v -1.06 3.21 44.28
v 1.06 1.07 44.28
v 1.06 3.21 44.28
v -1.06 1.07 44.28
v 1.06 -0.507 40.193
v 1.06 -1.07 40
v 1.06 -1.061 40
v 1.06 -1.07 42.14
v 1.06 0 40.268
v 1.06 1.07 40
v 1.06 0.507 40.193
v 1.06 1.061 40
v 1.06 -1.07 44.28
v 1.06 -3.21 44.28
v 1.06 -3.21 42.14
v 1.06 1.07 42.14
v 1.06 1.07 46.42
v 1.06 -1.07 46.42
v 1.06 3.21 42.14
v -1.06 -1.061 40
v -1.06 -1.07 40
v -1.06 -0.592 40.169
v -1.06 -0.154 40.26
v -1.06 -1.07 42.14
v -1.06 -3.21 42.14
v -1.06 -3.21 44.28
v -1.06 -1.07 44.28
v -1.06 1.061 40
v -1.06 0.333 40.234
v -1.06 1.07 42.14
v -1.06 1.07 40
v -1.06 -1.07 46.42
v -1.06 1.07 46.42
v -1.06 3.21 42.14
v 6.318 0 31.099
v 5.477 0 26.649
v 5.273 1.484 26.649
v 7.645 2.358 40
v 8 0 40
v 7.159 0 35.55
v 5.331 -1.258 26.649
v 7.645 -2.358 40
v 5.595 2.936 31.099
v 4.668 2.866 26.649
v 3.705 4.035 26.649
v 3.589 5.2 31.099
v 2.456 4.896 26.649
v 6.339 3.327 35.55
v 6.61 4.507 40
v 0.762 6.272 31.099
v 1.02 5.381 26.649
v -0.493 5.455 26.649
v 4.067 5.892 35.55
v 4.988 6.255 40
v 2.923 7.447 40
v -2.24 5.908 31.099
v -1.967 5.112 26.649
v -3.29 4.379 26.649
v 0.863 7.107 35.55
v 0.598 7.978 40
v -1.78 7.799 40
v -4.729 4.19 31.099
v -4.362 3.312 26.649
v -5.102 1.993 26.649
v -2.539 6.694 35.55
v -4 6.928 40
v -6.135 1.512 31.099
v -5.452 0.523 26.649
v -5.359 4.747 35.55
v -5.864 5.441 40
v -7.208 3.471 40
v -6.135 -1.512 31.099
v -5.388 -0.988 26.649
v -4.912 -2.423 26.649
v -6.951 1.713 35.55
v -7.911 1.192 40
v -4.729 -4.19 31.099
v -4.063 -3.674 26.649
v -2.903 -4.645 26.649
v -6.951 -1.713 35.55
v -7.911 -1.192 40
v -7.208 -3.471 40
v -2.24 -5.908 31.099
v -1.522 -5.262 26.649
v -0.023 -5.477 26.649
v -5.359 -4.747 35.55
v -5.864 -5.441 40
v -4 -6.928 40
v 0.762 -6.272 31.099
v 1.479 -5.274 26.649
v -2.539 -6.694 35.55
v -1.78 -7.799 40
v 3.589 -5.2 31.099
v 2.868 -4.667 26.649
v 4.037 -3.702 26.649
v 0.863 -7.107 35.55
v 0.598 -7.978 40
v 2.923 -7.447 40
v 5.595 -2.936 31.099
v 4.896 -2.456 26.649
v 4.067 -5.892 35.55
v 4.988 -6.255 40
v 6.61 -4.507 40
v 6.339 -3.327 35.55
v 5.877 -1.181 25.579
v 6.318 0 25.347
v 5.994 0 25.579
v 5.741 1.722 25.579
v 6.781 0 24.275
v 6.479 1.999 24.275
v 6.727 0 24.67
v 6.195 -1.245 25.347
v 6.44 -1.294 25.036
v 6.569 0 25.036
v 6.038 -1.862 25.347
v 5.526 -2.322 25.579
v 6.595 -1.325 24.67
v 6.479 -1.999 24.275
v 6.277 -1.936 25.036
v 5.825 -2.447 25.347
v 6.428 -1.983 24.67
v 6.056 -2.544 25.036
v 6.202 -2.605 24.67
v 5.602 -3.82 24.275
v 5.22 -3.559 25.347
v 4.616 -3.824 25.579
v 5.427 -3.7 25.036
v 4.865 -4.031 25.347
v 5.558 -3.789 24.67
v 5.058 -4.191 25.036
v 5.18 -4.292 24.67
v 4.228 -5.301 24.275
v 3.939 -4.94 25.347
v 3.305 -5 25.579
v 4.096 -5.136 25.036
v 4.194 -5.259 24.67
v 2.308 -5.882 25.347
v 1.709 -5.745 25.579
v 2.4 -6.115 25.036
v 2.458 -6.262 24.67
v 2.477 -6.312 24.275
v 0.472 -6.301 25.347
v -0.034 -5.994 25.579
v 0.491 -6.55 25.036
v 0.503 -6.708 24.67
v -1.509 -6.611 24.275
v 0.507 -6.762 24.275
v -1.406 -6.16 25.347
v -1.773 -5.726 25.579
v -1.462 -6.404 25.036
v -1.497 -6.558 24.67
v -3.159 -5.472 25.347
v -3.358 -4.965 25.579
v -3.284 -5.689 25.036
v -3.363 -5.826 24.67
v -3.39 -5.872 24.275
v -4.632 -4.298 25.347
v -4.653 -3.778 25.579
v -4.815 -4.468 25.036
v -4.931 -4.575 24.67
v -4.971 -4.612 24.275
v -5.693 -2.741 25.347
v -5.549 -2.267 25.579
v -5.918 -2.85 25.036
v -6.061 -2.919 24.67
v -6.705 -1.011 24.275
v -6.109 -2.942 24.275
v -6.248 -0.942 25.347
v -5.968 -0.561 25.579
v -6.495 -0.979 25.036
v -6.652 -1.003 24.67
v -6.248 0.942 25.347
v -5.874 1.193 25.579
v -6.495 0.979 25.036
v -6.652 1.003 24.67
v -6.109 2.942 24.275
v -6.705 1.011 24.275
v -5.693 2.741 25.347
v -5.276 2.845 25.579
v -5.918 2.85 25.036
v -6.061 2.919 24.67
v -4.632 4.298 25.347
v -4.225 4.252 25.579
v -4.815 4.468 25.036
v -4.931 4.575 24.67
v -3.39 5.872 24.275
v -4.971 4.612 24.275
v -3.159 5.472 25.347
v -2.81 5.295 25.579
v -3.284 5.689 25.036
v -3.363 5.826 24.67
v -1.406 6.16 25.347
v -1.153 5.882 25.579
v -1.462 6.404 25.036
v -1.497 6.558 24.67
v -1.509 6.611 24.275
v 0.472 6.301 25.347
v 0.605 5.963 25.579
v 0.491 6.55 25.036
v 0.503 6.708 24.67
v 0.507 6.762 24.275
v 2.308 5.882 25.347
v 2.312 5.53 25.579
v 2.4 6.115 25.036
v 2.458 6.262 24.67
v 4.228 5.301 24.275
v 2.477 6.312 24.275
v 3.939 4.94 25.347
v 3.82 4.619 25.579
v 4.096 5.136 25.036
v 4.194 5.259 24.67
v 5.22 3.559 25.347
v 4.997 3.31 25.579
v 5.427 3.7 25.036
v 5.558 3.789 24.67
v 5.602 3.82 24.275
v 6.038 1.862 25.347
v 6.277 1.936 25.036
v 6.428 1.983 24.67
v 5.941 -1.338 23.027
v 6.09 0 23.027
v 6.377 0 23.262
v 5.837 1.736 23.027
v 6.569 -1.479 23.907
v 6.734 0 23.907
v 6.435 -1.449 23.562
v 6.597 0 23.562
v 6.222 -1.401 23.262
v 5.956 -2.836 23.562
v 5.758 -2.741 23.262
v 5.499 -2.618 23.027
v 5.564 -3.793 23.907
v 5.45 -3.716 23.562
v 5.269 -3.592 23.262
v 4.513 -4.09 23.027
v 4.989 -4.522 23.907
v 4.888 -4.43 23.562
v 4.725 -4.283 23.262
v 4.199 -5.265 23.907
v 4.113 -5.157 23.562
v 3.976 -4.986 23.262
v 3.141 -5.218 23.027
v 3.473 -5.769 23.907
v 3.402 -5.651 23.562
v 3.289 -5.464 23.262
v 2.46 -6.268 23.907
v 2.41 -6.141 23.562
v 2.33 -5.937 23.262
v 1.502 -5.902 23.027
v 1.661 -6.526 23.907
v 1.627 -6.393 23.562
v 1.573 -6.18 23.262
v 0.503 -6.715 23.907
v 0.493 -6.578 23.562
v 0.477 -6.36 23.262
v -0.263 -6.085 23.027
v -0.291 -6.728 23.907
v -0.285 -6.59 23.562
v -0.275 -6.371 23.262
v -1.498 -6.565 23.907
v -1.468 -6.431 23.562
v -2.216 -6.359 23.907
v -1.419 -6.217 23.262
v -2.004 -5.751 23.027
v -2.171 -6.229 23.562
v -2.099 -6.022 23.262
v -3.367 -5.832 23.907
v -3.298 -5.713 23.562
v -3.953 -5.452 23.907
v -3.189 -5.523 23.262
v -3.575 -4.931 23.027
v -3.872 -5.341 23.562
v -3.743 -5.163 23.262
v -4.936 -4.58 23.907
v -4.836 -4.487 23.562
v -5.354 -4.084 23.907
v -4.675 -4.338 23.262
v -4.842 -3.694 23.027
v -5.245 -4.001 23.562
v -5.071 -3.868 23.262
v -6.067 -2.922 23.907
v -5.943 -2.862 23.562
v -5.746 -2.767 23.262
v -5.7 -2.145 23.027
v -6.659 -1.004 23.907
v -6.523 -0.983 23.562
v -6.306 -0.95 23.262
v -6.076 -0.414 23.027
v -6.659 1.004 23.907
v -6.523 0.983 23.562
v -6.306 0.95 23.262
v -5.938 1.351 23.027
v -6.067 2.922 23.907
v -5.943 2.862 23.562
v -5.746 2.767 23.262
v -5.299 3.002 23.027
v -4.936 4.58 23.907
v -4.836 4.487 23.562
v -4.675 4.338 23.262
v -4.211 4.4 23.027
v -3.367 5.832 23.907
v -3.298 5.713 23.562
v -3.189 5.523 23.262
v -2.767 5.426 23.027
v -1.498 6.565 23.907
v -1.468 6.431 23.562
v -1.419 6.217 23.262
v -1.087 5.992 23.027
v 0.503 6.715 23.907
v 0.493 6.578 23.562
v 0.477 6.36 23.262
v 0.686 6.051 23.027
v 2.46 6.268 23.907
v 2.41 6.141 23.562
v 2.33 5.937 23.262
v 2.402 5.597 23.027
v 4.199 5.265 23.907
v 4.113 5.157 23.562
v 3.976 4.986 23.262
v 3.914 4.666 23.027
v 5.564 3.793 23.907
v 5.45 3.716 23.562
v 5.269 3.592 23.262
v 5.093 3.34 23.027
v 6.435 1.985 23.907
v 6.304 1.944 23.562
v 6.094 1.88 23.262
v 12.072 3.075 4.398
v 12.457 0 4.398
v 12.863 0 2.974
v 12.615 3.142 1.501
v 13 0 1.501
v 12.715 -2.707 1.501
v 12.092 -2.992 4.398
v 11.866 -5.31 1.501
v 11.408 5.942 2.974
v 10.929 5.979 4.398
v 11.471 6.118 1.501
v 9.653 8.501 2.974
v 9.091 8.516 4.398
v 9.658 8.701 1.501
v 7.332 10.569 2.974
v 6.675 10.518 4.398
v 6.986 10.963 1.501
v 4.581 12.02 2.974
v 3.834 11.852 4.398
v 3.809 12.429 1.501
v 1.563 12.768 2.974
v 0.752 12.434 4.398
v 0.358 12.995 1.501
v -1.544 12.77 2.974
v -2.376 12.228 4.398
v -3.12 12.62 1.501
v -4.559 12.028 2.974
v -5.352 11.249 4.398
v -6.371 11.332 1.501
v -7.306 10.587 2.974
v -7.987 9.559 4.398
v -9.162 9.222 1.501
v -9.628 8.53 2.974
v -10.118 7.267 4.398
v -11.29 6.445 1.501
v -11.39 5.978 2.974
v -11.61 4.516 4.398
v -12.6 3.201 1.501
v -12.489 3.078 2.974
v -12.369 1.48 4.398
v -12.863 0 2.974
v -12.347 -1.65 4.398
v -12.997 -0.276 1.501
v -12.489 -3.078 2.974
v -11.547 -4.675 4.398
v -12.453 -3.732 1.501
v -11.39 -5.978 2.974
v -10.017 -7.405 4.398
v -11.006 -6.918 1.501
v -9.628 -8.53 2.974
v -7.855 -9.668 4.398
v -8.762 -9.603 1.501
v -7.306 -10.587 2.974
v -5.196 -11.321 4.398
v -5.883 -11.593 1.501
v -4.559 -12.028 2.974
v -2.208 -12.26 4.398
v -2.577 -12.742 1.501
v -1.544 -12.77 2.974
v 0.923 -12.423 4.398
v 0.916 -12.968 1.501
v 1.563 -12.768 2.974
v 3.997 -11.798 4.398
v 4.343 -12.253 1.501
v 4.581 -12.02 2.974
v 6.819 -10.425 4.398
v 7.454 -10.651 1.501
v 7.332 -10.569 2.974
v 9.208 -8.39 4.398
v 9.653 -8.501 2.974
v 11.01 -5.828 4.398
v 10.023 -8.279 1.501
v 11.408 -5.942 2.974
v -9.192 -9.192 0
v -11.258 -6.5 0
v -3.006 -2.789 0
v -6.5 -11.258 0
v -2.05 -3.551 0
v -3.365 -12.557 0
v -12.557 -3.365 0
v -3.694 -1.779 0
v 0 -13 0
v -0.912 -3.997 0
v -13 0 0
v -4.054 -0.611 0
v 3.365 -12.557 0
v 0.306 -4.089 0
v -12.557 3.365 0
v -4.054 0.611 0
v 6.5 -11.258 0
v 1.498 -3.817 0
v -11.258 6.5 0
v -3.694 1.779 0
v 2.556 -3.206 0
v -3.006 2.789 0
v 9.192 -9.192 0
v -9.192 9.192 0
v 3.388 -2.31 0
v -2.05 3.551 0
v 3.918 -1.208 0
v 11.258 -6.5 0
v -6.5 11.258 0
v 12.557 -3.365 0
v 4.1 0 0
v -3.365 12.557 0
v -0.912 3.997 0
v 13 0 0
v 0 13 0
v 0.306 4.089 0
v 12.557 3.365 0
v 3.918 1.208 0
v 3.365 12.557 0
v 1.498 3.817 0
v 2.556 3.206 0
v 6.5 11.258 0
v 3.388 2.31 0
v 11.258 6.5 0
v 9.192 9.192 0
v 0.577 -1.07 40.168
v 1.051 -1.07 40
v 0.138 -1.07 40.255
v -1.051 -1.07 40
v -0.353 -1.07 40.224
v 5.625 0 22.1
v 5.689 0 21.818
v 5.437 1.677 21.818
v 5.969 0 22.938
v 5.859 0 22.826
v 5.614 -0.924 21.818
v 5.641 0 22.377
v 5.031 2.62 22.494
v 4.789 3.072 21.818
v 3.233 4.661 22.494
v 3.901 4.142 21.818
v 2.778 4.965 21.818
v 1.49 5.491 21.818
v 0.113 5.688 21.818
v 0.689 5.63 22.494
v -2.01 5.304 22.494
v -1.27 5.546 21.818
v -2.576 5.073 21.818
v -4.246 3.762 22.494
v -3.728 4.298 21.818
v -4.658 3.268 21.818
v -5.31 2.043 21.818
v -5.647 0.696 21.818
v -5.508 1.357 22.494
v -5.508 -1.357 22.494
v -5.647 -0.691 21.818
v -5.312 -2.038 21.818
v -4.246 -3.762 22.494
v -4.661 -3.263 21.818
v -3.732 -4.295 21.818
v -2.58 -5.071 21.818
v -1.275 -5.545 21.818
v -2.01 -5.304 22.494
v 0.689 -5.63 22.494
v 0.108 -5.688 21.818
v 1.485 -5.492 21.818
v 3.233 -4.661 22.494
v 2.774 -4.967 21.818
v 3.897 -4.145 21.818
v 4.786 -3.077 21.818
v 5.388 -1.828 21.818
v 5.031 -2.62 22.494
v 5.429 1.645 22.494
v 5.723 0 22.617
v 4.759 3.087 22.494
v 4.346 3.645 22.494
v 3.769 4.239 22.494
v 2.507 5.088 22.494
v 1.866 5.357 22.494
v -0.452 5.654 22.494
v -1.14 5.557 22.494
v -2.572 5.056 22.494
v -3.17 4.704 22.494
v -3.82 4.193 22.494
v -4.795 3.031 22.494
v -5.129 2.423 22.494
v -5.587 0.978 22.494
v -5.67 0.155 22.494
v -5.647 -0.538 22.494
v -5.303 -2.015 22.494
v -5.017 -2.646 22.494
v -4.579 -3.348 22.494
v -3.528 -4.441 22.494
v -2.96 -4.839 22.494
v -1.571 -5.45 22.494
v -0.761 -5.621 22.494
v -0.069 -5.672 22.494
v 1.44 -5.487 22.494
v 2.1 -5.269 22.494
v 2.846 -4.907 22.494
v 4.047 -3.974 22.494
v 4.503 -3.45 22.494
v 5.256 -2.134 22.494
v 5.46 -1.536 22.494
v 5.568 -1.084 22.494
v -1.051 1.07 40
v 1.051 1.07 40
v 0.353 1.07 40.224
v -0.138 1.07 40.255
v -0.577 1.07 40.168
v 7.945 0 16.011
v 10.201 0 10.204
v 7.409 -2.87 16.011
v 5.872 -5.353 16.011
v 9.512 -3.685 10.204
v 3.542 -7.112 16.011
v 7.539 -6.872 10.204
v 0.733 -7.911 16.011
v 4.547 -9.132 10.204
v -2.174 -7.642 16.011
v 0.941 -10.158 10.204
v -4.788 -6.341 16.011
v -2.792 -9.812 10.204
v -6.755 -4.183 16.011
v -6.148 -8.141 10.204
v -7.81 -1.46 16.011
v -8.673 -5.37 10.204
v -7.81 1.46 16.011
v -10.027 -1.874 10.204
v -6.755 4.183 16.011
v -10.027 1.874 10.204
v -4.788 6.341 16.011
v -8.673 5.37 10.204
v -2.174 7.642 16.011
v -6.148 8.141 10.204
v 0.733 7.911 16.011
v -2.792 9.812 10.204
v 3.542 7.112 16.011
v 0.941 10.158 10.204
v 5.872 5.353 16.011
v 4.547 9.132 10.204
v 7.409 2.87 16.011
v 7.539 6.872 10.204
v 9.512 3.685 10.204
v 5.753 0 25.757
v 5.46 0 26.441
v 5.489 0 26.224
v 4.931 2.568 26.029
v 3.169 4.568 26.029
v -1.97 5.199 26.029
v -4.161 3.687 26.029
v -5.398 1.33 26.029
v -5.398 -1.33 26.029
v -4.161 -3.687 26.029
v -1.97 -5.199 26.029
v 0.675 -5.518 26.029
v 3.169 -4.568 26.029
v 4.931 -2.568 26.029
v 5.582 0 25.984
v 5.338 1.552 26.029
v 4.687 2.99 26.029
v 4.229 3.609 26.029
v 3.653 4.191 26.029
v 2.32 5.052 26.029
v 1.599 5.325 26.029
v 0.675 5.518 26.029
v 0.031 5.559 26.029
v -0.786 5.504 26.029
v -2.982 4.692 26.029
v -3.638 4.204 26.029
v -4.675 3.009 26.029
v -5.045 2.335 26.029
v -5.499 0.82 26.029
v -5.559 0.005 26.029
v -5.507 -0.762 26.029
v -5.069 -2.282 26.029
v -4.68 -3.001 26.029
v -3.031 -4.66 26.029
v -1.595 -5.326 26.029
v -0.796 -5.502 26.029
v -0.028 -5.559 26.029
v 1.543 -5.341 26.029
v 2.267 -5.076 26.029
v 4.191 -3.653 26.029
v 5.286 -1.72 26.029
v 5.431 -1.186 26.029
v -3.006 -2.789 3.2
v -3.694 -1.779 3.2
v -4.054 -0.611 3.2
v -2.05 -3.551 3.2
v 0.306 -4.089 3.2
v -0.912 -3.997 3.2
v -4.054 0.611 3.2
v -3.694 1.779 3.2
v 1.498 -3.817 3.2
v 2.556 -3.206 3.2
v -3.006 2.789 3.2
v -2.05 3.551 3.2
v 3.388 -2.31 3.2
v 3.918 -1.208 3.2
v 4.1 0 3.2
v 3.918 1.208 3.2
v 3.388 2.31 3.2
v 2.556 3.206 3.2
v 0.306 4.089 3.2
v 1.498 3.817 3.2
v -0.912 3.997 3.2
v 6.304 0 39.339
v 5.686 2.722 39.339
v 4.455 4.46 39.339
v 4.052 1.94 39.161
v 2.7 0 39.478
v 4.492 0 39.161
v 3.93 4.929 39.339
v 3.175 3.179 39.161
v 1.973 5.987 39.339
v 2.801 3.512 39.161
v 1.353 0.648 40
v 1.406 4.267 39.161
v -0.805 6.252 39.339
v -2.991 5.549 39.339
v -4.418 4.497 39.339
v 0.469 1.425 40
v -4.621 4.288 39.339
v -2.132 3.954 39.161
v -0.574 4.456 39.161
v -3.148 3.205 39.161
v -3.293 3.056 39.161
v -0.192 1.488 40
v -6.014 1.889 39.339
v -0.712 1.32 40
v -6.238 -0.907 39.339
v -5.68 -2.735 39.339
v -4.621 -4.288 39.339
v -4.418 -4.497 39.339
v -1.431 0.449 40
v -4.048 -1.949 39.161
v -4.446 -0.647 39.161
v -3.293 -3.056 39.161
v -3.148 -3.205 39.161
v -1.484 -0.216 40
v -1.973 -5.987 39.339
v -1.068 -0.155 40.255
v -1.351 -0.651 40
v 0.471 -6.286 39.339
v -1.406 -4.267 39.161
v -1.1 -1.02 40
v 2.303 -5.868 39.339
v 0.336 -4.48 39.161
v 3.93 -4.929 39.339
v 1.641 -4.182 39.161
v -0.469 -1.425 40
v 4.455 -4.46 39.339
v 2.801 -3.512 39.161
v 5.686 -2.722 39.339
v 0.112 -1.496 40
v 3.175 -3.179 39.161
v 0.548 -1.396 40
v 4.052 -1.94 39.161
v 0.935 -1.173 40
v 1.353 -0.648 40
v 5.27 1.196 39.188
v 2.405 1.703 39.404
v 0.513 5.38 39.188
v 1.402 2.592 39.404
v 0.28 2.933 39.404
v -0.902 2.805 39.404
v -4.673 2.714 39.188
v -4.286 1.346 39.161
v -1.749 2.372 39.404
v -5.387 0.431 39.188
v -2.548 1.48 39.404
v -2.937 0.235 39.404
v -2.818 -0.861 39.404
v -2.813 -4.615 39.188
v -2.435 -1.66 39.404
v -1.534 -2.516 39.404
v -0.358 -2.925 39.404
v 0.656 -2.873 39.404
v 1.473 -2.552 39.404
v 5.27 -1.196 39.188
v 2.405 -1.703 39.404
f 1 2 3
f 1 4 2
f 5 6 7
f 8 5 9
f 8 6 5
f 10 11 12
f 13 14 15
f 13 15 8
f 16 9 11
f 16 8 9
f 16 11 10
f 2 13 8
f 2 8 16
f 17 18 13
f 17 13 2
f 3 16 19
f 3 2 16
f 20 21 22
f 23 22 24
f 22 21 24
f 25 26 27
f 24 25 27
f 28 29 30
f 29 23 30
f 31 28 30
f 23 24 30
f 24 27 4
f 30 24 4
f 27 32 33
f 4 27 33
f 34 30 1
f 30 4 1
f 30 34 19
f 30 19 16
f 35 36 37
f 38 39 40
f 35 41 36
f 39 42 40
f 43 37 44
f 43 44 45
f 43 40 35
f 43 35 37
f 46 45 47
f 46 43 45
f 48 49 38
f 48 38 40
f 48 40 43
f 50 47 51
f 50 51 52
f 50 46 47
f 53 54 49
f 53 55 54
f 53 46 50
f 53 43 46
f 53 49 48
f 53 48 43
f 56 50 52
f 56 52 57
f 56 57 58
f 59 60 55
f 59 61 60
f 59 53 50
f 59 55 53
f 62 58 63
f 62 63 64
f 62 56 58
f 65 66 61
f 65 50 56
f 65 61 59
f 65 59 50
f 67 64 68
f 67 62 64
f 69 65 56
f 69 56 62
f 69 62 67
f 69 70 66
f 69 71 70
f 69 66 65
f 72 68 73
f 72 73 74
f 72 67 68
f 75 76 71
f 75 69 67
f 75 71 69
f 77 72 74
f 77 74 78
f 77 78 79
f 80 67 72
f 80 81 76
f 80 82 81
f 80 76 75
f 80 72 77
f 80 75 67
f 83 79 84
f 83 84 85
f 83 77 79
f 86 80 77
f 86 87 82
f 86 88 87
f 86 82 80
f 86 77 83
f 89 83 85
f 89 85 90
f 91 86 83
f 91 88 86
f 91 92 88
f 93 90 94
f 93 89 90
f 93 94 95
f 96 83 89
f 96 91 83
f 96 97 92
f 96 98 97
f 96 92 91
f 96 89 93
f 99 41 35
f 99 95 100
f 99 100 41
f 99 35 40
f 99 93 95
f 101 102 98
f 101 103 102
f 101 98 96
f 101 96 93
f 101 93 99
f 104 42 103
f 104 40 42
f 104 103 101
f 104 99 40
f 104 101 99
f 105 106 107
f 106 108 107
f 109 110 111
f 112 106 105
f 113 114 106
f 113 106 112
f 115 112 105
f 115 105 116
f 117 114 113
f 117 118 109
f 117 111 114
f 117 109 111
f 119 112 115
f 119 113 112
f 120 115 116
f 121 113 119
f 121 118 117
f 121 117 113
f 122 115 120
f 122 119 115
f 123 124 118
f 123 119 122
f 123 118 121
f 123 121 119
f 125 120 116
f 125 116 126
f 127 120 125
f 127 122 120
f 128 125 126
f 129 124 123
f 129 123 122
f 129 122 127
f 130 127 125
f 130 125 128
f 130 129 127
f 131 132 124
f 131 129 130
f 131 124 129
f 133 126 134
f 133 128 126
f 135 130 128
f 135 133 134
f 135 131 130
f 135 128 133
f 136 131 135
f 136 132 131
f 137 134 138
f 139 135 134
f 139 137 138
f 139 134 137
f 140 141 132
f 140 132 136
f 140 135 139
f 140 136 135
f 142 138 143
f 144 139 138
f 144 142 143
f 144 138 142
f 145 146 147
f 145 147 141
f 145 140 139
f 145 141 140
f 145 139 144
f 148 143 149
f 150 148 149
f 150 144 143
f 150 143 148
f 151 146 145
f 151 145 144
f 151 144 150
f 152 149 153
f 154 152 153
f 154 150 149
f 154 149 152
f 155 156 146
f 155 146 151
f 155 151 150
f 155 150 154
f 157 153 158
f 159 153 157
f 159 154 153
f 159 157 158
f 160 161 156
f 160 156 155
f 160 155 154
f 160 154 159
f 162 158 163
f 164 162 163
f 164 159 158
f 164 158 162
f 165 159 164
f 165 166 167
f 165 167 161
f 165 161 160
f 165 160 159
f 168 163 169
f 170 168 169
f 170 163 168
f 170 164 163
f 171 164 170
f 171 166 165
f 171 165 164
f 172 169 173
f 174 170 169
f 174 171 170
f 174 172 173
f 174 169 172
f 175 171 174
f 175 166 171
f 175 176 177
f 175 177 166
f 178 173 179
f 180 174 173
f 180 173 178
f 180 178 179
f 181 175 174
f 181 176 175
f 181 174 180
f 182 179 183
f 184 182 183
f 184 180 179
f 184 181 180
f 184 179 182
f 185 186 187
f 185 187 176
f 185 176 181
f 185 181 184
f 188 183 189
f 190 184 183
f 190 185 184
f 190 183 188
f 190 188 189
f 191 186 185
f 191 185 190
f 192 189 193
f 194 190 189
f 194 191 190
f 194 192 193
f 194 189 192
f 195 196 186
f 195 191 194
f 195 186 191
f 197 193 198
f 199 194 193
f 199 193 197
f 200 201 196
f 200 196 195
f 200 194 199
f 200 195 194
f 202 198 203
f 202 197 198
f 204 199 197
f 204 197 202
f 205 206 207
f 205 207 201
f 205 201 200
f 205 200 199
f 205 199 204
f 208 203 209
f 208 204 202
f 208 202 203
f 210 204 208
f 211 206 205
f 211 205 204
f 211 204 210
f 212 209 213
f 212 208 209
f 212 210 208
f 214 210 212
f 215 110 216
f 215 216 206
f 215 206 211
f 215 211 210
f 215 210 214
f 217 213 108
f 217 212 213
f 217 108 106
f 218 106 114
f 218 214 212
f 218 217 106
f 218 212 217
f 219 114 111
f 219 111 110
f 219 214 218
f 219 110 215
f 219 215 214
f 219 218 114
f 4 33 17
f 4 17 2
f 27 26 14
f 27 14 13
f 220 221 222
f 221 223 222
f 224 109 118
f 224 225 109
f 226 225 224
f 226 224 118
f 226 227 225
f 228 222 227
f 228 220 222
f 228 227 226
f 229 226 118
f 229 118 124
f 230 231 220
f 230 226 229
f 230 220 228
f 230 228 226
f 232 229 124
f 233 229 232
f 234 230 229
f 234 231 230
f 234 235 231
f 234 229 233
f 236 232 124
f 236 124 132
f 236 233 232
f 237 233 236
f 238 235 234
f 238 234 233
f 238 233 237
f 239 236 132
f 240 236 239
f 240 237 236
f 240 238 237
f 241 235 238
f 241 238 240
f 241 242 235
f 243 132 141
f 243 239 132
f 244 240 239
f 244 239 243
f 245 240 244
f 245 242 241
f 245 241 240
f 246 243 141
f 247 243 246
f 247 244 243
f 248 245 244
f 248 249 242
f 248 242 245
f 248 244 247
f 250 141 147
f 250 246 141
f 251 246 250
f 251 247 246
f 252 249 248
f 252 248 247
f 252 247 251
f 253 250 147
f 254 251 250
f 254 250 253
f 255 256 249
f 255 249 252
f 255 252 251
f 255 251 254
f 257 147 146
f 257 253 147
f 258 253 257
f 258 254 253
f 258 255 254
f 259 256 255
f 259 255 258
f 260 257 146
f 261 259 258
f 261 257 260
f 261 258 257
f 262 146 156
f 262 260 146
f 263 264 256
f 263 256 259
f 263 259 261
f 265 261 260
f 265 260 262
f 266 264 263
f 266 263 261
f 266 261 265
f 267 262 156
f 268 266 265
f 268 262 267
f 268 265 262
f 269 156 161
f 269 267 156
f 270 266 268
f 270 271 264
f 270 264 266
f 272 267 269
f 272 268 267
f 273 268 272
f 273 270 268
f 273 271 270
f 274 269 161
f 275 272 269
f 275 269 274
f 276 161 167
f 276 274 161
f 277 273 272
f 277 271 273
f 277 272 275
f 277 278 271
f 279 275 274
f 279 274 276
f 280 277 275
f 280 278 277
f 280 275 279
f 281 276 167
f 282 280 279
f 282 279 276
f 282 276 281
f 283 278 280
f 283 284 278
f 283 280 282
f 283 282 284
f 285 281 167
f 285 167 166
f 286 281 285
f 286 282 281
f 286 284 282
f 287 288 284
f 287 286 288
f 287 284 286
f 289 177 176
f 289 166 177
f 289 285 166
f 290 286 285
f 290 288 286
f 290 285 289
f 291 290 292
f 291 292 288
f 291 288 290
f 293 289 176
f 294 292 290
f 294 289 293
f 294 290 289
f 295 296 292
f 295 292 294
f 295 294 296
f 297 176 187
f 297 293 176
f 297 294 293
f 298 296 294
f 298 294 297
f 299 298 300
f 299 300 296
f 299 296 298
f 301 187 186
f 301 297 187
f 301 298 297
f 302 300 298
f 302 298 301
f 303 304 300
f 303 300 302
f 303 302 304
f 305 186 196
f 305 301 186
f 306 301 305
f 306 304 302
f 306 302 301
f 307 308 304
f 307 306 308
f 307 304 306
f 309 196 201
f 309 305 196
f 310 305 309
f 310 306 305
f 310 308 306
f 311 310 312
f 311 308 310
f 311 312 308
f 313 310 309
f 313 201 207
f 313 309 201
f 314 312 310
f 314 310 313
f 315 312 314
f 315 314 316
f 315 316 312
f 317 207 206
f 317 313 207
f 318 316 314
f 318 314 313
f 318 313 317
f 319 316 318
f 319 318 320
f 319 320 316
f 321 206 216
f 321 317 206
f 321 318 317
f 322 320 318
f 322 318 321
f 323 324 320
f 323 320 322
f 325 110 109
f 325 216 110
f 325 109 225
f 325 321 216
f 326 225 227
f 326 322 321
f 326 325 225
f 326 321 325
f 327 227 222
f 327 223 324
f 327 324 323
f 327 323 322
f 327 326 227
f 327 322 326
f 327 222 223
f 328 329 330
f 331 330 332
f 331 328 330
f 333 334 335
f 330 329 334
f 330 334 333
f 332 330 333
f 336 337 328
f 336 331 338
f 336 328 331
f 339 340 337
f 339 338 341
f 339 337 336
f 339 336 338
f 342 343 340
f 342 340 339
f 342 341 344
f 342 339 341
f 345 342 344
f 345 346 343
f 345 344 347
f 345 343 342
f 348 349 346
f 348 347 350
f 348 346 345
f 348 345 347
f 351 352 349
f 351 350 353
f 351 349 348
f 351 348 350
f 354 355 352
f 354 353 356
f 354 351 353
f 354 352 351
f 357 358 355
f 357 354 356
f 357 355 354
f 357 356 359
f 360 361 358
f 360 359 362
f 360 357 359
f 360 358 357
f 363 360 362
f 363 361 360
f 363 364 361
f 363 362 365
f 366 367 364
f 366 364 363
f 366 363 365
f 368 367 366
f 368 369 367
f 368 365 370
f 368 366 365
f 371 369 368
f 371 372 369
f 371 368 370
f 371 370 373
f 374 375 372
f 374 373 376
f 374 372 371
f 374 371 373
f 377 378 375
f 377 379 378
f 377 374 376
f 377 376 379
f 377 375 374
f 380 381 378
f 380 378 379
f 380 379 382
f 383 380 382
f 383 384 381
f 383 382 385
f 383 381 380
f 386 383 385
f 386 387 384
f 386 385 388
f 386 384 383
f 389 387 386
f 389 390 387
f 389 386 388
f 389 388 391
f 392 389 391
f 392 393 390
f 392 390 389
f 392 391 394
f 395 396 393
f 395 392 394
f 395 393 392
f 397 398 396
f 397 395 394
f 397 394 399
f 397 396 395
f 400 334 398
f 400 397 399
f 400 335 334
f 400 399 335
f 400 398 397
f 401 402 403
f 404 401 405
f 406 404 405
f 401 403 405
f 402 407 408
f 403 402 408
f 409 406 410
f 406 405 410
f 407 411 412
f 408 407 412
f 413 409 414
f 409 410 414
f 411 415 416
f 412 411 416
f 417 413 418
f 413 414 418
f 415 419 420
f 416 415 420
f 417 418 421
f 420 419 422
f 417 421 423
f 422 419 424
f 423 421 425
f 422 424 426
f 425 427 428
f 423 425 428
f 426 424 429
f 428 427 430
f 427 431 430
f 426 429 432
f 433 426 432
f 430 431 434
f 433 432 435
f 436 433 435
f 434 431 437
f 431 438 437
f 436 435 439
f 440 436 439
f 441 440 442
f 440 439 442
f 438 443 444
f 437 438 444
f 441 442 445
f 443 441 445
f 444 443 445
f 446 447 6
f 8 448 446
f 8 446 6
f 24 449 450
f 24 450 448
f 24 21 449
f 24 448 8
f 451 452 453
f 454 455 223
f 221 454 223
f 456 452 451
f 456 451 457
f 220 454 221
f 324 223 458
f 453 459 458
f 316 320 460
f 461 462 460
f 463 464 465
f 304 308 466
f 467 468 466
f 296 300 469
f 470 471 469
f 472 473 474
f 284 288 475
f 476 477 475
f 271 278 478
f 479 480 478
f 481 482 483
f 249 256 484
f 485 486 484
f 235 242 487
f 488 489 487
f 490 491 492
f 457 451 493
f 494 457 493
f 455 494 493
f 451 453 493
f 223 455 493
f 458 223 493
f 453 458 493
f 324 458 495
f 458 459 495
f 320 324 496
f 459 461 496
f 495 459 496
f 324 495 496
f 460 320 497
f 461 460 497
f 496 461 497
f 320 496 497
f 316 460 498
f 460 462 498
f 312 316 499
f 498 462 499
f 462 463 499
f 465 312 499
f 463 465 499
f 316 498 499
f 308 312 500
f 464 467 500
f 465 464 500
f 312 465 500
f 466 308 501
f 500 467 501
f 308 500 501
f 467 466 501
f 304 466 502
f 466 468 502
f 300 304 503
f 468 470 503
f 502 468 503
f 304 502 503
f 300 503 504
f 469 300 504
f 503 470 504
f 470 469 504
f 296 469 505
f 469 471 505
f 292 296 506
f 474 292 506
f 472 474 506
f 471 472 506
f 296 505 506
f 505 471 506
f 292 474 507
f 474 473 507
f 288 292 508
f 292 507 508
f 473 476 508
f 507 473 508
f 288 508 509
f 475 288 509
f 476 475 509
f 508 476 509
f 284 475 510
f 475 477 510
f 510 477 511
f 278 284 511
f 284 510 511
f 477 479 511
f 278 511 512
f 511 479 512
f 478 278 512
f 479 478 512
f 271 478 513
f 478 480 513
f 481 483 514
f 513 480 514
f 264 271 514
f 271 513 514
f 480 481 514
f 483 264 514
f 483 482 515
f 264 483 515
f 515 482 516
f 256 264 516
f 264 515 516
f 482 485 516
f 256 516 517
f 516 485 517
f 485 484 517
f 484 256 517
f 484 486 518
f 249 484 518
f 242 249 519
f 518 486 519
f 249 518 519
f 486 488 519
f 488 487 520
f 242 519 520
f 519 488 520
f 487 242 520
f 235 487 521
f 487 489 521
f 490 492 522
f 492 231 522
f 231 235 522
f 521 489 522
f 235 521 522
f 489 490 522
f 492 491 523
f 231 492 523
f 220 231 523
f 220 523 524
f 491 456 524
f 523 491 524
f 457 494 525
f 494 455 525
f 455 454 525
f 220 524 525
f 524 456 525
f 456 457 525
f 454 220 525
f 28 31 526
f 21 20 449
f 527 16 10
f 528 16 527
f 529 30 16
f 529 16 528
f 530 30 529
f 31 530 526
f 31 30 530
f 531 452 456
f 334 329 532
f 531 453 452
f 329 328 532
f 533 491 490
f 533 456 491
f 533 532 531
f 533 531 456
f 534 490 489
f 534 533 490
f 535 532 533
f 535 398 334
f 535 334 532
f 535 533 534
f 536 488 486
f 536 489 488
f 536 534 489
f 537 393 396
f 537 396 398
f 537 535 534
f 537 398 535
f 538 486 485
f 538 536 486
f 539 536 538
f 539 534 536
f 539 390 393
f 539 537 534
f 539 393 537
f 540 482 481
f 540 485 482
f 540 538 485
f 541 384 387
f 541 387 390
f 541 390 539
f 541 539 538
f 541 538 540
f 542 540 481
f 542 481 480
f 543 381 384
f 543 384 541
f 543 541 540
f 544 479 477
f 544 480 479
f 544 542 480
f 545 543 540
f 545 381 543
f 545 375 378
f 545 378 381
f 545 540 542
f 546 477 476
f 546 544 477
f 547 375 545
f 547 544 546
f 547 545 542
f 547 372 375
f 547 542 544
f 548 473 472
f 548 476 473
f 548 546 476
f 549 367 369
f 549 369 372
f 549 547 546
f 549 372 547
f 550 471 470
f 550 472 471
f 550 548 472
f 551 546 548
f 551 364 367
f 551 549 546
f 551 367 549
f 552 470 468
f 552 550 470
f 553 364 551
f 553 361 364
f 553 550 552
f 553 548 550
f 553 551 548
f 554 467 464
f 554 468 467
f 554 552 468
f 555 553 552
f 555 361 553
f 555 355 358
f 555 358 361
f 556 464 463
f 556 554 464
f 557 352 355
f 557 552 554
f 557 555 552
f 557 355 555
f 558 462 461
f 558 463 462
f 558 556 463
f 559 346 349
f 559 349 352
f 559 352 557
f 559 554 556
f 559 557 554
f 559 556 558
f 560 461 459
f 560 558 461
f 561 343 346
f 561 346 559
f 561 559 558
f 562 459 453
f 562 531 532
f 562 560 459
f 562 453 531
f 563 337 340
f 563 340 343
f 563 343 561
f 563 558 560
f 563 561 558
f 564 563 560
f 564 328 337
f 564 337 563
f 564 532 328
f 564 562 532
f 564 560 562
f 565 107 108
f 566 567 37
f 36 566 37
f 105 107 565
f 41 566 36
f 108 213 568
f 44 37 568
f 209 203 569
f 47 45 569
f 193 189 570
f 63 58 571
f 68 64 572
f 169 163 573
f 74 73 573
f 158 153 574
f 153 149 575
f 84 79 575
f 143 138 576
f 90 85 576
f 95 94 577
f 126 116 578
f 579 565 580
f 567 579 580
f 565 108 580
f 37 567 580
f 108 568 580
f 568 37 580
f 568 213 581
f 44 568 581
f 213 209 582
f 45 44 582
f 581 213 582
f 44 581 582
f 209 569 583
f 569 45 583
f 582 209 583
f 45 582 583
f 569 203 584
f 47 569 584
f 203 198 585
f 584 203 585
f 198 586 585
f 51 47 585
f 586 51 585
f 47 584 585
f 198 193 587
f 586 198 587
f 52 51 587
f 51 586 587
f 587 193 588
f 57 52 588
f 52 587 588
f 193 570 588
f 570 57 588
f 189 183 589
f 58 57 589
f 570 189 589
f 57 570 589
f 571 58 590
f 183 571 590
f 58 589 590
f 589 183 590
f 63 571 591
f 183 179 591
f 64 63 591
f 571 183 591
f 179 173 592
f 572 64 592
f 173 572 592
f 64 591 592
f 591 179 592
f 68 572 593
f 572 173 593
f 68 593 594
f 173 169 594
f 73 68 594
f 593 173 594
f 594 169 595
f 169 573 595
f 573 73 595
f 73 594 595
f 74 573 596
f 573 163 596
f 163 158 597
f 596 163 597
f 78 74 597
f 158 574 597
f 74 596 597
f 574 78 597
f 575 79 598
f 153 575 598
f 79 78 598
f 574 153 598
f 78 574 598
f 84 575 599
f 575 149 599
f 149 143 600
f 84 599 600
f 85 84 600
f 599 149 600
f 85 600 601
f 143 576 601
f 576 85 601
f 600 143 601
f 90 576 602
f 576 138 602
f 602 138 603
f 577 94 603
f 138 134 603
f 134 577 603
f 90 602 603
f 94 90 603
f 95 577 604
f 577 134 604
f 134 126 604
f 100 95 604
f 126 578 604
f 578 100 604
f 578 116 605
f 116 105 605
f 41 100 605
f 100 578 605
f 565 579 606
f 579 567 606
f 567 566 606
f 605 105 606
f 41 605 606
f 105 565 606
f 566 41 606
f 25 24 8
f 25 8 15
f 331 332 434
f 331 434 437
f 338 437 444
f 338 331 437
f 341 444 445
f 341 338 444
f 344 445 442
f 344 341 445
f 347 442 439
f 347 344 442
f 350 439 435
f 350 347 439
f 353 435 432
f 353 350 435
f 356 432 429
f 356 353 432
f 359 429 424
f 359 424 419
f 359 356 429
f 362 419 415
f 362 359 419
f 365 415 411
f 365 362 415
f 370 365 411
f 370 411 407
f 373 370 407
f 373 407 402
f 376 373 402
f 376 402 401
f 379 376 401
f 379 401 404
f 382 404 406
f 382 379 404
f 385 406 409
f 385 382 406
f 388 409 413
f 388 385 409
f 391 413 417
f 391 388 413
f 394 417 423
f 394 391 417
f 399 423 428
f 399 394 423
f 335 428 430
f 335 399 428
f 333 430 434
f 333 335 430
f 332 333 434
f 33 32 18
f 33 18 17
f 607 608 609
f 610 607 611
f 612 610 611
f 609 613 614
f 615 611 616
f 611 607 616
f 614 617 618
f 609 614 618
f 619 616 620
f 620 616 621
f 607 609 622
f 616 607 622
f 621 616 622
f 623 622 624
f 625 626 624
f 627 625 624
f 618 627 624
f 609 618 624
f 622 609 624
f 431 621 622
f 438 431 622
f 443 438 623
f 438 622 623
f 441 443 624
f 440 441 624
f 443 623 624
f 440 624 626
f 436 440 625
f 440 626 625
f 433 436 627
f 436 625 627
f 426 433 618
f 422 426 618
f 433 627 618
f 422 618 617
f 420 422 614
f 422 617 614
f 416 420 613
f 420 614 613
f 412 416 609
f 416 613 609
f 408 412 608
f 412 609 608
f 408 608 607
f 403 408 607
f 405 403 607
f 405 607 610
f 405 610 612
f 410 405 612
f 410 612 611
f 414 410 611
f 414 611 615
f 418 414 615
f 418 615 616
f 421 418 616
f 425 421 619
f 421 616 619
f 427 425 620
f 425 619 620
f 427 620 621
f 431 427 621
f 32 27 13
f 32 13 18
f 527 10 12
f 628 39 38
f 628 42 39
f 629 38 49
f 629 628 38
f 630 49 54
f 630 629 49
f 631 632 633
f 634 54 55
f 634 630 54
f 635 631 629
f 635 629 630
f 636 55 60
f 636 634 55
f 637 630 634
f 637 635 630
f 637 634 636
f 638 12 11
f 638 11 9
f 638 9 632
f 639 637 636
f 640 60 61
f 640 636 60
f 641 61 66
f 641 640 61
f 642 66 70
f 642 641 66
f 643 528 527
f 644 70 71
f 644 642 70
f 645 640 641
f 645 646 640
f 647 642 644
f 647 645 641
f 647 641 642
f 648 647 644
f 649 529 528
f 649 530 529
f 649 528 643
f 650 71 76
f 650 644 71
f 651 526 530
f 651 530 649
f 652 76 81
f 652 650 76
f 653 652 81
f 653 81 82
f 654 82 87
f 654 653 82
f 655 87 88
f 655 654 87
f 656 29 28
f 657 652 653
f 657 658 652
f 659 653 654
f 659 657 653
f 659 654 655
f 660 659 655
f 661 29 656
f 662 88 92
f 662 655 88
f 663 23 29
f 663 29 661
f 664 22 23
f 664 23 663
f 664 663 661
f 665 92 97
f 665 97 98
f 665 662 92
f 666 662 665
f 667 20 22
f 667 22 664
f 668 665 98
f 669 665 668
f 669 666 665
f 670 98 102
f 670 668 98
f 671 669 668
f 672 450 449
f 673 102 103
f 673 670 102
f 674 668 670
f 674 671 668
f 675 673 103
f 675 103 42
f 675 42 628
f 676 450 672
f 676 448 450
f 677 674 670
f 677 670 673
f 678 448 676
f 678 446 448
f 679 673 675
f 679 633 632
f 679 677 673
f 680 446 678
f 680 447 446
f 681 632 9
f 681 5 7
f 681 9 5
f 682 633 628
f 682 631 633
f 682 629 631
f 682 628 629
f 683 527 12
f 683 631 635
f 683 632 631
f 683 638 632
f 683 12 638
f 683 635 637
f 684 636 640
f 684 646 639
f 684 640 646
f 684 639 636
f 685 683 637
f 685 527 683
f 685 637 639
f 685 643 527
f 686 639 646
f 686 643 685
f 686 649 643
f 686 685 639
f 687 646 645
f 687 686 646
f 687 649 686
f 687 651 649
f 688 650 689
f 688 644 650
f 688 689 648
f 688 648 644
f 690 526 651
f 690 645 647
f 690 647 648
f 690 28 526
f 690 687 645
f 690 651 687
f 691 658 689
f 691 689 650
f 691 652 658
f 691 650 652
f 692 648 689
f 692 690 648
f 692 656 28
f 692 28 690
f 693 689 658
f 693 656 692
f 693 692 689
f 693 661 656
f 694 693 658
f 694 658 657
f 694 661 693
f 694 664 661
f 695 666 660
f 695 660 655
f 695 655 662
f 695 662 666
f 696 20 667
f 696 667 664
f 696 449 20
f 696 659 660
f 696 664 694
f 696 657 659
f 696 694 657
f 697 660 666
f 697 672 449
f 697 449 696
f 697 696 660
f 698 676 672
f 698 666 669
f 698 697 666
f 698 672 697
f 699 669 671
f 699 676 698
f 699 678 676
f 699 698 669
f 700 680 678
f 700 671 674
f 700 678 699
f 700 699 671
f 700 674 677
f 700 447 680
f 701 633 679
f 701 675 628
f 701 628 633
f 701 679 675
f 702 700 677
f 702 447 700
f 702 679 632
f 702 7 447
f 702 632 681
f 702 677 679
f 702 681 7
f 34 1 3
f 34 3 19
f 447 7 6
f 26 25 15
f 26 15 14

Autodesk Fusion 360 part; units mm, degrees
sketch "Esquisse1" plane through (0, 0, 0) normal (0, 1, 0) x (1, 0, 0)
  line L0 (0, 0) -> (13, 0)
  line L1 (13, 0) -> (0, 0)
  line L2 (0, 0) -> (0, -42)
  line L3 (13, 0) -> (13, -3)
  line L4 (8, -40) -> (5.3072, -25.7485)
  line L5 (13, -3) -> (5.3072, -22.8015)
  circle A0 centre (5.3072, -24.275) radius 1.4735
  line L6 (5.3072, -25.7485) -> (5.3072, -22.8015)
  line L7 (0, -42) -> (-0.7188, -42)
  arc A1 (8, -40) -> (-0.7188, -42) centre (4.75, -45.8363) ccw
  line L8 (0, 0) -> (4.1, 0)
  line L9 (4.1, 0) -> (4.1, -3.2)
  line L10 (4.1, -3.2) -> (0, -3.2)
  line L11 (0, -3.2) -> (0, 0)
  dimension "d1" = 13
  dimension "d2" = 42
  dimension "d3" = 3
  dimension "d4" = 4.1
  dimension "d5" = 3.2
revolve "Révolution1" add sketch "Esquisse1" angle 360 about axis through (0, 0, 0) along (0, 0, 1) contours L0 L1 L2 L3 L4 L5 A0 A1 L9 L10 | A0 L6 | A0 L6
fillet "Congé1" radius 1 2 edges at (-4.9481, -1.9192, 25.7485) (-4.9481, -1.9192, 22.8015)
fillet "Congé2" radius 8 1 edges at (-12.1203, -4.701, 3)
sketch "Esquisse2" plane through (0, 0, 0) normal (1, 0, 0) x (0, 1, 0)
  line L0 (-1.07, 40) -> (-1.07, 42.14)
  line L1 (-1.07, 42.14) -> (-3.21, 42.14)
  line L2 (-3.21, 42.14) -> (-3.21, 44.28)
  line L3 (-3.21, 44.28) -> (-1.07, 44.28)
  line L4 (-1.07, 44.28) -> (-1.07, 46.42)
  line L5 (-1.07, 46.42) -> (1.07, 46.42)
  line L6 (1.07, 46.42) -> (1.07, 44.28)
  line L7 (1.07, 44.28) -> (3.21, 44.28)
  line L8 (3.21, 44.28) -> (3.21, 42.14)
  line L9 (3.21, 42.14) -> (1.07, 42.14)
  line L10 (1.07, 42.14) -> (1.07, 40)
  line L11 (1.07, 40) -> (-1.07, 40)
  point P0 (0, 40)
  point P1 (0, 40)
  dimension "d12" = 2.14
extrude "Extrusion1" add sketch "Esquisse2" along normal blind 2.12 from surface at -1.06
